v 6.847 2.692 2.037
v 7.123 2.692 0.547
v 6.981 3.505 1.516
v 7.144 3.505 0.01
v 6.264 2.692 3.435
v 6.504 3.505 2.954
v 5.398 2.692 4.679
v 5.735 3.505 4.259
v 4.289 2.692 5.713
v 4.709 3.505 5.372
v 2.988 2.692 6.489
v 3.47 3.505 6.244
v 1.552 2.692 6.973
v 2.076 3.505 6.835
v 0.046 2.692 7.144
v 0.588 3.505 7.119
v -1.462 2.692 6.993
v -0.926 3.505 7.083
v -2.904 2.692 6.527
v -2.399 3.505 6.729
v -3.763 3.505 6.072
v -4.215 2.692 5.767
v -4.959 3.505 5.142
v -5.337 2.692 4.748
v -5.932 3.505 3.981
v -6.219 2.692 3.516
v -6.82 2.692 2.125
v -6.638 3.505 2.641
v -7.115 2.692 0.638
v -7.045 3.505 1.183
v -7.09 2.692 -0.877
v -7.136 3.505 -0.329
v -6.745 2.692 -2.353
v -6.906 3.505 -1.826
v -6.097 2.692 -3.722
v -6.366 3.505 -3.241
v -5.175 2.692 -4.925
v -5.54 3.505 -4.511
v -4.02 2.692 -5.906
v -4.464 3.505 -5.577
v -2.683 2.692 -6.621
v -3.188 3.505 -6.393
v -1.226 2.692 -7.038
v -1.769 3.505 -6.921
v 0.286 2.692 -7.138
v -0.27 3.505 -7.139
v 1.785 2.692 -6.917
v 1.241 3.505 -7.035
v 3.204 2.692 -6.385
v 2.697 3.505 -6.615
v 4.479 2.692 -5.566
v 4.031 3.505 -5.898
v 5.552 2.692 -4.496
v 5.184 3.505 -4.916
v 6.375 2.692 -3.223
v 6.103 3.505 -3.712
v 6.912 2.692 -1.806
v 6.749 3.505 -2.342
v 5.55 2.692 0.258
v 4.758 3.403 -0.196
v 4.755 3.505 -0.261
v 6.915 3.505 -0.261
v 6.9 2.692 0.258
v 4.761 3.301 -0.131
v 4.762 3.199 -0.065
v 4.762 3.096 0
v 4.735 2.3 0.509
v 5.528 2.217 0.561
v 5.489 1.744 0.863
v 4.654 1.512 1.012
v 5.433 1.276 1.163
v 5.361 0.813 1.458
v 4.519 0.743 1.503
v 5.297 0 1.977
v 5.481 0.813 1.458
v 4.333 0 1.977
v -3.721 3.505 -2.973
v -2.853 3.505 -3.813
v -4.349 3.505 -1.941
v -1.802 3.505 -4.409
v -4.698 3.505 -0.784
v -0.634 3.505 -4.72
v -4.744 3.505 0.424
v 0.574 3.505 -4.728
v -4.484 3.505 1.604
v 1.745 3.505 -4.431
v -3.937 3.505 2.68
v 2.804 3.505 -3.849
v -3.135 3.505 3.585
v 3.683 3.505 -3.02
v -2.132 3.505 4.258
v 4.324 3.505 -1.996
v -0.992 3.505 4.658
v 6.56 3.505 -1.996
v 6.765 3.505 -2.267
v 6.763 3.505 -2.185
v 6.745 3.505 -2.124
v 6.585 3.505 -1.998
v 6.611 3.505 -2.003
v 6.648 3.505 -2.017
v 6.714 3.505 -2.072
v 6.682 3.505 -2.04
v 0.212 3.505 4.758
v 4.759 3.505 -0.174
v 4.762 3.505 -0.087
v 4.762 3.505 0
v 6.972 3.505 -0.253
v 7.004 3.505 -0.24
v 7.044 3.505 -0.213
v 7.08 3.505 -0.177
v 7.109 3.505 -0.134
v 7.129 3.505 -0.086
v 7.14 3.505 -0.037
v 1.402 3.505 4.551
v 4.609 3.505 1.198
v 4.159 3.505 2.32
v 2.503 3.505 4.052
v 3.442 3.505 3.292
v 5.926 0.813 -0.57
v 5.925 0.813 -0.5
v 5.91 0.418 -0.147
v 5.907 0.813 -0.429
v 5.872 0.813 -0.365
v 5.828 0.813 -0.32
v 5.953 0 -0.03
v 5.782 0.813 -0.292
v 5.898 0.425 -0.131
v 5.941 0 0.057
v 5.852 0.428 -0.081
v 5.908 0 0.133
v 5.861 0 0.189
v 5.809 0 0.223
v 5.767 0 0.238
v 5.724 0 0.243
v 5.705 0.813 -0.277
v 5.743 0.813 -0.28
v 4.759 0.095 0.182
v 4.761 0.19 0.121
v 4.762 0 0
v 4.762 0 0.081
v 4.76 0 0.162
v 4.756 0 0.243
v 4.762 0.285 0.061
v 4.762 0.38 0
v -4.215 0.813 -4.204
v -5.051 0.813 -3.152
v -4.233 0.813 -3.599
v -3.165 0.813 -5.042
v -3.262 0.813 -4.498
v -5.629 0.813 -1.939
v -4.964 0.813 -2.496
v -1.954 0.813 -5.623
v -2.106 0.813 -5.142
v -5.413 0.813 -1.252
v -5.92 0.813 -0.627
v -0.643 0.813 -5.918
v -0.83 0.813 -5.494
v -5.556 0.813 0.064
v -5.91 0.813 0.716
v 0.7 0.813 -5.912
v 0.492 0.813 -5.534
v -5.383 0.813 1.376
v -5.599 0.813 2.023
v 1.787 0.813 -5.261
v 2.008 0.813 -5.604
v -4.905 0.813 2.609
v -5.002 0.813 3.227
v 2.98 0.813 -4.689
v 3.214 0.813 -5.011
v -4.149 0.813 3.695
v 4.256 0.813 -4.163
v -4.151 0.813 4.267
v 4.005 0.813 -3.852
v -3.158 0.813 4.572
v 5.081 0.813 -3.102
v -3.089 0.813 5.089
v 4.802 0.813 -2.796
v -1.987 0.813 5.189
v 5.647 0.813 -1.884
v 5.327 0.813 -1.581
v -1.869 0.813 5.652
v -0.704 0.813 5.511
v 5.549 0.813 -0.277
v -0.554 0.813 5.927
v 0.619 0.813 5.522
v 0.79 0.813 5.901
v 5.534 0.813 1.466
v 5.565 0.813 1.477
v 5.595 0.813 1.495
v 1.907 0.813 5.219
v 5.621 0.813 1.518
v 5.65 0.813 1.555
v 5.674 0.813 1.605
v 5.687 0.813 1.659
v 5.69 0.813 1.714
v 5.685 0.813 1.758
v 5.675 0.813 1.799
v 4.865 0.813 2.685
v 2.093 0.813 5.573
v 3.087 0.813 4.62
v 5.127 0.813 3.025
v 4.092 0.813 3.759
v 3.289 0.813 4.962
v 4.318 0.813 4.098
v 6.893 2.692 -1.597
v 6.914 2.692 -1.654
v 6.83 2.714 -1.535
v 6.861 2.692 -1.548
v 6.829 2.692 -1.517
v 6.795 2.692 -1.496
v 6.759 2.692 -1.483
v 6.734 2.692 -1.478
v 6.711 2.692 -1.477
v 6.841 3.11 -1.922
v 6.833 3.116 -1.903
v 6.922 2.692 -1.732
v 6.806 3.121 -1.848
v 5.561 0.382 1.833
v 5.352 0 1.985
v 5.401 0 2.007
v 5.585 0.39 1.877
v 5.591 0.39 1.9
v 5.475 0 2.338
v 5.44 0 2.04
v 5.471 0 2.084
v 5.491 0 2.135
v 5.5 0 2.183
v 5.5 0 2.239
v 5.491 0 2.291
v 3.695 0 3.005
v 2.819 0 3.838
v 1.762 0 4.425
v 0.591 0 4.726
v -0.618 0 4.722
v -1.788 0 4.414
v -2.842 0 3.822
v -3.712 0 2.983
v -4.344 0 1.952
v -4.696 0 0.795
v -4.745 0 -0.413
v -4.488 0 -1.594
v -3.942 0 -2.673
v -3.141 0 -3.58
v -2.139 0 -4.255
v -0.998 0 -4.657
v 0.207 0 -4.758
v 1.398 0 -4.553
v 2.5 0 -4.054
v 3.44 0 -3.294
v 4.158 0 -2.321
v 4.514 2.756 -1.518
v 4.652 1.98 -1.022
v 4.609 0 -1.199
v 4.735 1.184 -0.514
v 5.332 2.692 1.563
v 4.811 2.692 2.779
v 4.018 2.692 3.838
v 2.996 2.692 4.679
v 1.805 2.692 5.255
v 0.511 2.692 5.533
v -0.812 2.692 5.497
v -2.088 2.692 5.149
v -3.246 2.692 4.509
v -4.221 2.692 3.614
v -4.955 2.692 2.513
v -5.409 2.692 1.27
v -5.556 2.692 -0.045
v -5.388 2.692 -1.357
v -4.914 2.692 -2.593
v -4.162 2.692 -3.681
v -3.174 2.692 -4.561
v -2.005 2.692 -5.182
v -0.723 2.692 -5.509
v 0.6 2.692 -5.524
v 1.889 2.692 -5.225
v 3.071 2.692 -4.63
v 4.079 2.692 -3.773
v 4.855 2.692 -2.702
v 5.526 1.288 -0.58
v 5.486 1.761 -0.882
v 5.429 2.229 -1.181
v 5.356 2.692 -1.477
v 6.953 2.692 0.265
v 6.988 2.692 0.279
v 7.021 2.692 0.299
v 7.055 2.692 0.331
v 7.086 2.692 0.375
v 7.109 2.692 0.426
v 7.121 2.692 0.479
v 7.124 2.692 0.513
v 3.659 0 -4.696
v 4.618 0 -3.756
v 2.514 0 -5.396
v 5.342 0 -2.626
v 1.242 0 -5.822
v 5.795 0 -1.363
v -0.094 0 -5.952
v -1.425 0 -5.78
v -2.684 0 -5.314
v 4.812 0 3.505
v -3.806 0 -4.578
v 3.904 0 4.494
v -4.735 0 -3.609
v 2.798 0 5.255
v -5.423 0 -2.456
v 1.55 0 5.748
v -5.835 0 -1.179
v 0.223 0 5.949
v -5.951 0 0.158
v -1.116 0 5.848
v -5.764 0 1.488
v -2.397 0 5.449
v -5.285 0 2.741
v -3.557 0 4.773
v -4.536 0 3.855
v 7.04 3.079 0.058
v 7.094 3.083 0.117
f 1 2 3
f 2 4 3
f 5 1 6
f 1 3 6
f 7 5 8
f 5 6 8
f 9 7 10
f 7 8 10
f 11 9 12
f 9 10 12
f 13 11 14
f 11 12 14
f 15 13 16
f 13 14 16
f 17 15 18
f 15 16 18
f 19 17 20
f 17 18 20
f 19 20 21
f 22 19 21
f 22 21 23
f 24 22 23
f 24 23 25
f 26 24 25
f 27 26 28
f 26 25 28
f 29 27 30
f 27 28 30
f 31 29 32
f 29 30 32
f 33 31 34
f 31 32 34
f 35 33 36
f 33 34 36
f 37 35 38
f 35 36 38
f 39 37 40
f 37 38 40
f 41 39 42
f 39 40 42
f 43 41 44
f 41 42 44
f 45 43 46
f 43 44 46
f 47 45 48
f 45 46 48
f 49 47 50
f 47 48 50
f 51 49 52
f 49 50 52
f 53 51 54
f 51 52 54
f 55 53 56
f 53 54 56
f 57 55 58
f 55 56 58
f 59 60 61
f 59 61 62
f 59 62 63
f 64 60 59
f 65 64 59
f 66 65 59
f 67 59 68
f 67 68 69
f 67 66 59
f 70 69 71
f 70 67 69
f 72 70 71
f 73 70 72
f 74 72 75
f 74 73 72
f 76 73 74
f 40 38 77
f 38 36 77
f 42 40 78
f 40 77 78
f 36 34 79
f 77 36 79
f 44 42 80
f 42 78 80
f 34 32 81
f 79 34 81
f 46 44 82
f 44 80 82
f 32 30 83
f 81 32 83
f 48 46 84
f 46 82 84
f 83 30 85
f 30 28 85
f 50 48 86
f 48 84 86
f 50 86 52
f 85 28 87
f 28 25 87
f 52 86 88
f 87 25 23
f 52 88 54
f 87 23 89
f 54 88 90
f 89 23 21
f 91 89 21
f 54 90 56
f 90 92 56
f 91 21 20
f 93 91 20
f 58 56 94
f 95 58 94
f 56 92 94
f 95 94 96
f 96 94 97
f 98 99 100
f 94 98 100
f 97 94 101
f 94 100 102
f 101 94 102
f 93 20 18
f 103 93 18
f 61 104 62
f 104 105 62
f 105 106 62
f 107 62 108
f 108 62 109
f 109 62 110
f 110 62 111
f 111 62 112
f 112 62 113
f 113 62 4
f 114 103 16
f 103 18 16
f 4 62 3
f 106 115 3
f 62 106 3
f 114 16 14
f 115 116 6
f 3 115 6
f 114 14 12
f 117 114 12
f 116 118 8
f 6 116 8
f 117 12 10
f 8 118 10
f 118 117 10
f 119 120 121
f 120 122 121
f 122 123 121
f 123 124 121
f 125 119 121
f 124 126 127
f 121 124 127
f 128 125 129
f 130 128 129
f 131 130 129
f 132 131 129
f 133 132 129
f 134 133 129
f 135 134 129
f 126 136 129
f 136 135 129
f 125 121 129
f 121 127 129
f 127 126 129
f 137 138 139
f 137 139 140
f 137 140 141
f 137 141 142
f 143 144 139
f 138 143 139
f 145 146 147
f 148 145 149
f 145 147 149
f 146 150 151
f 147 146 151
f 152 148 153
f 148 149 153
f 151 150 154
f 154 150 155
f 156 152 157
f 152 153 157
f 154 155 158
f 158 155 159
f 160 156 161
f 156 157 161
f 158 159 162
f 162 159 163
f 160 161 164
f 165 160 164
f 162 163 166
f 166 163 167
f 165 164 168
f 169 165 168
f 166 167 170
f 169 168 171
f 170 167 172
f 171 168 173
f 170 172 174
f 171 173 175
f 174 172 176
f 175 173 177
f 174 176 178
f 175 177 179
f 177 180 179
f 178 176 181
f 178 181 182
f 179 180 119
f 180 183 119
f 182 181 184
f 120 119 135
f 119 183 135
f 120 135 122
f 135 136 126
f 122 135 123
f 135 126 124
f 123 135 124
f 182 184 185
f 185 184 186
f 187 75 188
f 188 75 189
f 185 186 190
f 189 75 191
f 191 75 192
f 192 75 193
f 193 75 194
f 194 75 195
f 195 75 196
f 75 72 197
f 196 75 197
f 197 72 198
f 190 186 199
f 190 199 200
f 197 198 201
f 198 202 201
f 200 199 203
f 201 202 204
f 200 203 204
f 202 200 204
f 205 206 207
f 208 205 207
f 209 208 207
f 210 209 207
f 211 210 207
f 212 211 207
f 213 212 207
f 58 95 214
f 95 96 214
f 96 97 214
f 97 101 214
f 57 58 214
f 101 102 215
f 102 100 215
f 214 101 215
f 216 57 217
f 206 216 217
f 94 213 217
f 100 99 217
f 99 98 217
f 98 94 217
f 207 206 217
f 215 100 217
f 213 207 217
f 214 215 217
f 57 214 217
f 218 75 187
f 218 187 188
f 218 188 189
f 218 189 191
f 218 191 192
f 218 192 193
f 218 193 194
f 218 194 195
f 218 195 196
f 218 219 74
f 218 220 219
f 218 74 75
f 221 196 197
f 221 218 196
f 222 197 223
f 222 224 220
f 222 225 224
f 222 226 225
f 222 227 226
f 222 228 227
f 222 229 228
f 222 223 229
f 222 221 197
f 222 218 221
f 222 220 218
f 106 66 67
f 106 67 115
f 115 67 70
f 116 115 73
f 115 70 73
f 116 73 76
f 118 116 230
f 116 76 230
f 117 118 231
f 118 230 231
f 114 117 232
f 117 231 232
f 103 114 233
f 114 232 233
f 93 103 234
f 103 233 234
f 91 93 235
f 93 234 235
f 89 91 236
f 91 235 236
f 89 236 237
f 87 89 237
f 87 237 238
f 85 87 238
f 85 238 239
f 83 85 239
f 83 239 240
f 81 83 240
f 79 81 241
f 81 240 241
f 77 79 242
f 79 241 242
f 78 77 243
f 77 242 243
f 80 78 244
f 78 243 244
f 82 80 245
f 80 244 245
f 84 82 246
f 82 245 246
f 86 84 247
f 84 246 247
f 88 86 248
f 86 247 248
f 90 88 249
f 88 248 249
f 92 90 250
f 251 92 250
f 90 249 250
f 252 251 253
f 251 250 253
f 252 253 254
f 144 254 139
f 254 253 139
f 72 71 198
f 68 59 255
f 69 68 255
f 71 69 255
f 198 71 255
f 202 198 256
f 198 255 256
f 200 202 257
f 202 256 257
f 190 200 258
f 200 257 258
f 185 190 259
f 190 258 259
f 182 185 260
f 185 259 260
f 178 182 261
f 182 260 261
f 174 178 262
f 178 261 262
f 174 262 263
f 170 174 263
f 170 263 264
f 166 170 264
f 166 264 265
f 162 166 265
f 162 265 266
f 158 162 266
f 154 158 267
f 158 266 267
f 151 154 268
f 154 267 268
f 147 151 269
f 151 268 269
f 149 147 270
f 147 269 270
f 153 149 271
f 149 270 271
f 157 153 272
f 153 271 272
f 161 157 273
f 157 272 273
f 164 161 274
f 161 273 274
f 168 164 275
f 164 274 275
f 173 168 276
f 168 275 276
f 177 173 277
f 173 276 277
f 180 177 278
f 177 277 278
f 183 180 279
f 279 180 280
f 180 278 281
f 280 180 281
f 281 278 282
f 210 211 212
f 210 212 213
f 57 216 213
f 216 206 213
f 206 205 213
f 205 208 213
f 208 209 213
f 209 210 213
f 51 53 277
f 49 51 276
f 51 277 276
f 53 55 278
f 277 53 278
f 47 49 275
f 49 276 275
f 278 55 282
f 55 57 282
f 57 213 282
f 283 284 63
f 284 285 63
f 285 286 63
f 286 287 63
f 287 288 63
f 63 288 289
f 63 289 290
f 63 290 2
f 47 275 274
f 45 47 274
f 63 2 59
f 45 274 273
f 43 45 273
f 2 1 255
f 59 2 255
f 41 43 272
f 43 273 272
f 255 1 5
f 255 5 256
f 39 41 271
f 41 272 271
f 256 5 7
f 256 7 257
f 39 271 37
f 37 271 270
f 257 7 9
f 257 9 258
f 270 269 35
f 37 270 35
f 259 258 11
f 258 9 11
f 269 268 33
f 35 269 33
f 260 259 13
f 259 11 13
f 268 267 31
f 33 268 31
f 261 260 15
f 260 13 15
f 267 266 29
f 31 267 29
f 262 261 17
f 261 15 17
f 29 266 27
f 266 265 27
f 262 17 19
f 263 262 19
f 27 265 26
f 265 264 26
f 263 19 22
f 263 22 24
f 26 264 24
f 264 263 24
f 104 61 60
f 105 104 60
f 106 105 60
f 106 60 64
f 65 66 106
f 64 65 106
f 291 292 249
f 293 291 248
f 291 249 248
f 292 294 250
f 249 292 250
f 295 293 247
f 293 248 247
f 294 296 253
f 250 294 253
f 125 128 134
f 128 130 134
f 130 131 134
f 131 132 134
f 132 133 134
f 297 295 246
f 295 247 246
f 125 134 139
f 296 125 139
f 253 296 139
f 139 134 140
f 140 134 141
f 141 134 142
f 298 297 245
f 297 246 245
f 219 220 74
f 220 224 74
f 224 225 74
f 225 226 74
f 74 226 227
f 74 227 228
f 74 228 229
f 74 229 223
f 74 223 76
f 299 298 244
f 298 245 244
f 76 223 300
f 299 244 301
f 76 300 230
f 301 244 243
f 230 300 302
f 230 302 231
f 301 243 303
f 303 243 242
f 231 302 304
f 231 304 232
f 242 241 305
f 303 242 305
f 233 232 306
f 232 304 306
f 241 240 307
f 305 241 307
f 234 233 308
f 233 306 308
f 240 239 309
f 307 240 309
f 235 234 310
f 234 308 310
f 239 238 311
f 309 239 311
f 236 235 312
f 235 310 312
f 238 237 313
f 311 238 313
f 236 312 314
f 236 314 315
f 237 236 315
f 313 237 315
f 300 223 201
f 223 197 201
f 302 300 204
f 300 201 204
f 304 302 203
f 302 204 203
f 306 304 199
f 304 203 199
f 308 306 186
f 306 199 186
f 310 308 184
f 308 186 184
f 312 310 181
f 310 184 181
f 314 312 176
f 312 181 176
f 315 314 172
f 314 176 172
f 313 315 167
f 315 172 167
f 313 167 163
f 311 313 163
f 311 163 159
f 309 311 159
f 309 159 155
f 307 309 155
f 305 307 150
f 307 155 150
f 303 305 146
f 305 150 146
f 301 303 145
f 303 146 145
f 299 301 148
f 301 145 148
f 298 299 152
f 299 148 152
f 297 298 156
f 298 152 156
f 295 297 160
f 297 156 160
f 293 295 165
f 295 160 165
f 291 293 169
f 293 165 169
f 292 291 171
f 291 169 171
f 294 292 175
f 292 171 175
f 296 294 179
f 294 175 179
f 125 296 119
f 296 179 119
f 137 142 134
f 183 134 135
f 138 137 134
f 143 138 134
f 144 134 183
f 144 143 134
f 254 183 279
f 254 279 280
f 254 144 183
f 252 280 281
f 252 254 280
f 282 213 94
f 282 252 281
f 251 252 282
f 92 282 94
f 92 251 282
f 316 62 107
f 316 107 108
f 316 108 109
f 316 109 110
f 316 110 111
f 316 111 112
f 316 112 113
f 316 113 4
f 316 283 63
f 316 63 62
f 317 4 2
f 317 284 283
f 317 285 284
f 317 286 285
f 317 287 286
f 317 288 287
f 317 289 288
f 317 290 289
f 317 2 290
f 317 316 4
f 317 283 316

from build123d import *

# Parameters (mm, degrees)
CUT_EXTRUDE1_DEPTH = 8.14375
FILLET1_R          = 0.2286


with BuildPart() as part:
    # Sketch1 → Revolve1 (revolve)
    with BuildSketch(Plane.XY):
        Polygon((4.7625, 0), (5.953125, 0), (5.953125, 0.8128), (5.55625, 0.8128), (5.55625, 2.6924), (7.14375, 2.6924), (7.14375, 3.5052), (4.7625, 3.5052), align=None)
    revolve(axis=Axis((0, 18.790103573, 0), (0, -1, 0)))

    # Sketch2 → Cut-Extrude1 (cut, through all)
    with BuildSketch(Plane(origin=(0, 0, 0), x_dir=(0, 0, -1), z_dir=(1, 0, 0))):
        Polygon((1.996034078, 3.5052), (0.261163337, 3.5052), (-1.977379553, 0), (-0.242508813, 0), align=None)
    extrude(amount=CUT_EXTRUDE1_DEPTH, mode=Mode.SUBTRACT)

    # Fillet1
    fillet1_edges = [part.edges().sort_by_distance(p)[0] for p in [
        (5.699722818, 0.405539452, 1.718387925),
        (7.142556324, 3.300739905, -0.130587994),
        (5.95151838, 0.596281949, -0.138297622),
        (6.929392139, 3.099377561, -1.736861724),
    ]]
    fillet(fillet1_edges, radius=FILLET1_R)


solid = part.part
